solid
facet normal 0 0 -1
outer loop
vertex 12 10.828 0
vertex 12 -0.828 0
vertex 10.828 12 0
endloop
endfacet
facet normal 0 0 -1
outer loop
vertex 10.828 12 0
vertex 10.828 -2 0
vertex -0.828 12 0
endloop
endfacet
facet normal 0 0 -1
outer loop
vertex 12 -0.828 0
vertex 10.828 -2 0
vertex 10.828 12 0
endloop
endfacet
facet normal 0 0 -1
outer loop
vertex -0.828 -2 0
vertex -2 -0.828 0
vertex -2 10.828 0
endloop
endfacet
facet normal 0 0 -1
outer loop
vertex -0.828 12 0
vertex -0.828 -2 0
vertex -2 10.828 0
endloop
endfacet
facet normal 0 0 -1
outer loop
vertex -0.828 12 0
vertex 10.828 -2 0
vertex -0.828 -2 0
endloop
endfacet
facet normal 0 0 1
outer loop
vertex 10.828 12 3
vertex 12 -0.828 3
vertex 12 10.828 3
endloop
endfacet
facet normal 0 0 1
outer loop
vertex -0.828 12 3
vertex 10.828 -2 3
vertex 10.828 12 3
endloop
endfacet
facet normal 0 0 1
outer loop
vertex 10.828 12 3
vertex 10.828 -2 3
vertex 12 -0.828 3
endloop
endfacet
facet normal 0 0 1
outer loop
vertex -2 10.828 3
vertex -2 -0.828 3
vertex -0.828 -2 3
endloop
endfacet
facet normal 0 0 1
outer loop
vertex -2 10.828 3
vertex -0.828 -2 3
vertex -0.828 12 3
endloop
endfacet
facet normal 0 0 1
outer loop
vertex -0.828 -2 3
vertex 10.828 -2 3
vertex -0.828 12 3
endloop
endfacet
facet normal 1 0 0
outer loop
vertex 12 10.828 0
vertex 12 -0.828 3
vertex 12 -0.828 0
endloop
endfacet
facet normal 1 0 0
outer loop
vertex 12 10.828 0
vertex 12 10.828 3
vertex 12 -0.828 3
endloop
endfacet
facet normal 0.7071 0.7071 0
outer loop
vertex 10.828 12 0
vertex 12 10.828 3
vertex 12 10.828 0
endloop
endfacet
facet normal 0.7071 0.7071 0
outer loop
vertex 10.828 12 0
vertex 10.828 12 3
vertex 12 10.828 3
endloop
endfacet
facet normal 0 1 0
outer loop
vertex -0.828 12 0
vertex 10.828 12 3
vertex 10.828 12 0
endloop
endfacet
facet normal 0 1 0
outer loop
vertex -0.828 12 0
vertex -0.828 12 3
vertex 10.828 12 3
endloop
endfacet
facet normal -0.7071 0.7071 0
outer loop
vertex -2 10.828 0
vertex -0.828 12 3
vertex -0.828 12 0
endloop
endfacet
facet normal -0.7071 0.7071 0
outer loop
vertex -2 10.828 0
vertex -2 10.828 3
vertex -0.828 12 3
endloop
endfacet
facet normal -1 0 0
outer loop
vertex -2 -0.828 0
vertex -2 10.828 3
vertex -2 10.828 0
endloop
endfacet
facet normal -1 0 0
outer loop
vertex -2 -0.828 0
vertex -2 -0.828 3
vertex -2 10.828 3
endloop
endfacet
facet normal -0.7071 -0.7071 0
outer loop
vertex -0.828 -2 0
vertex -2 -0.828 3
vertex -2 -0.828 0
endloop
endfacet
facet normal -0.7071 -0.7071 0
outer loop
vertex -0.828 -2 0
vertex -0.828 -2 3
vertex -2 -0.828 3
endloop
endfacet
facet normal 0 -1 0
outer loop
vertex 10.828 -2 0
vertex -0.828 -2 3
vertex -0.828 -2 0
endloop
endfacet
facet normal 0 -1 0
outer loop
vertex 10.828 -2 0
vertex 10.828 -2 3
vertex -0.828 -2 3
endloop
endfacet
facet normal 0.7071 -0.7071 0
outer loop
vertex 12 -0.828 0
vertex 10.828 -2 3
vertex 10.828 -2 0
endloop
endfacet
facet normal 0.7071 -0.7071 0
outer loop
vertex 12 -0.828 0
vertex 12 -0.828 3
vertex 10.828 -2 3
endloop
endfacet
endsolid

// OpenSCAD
// offset() in delta+chamfer mode: beveled corners (Clipper2 square joins),
// lifted to a solid by linear_extrude as the corpus test requires a solid for
// non-_2d files.
linear_extrude(height = 3) offset(delta = 2, chamfer = true) square(10);
